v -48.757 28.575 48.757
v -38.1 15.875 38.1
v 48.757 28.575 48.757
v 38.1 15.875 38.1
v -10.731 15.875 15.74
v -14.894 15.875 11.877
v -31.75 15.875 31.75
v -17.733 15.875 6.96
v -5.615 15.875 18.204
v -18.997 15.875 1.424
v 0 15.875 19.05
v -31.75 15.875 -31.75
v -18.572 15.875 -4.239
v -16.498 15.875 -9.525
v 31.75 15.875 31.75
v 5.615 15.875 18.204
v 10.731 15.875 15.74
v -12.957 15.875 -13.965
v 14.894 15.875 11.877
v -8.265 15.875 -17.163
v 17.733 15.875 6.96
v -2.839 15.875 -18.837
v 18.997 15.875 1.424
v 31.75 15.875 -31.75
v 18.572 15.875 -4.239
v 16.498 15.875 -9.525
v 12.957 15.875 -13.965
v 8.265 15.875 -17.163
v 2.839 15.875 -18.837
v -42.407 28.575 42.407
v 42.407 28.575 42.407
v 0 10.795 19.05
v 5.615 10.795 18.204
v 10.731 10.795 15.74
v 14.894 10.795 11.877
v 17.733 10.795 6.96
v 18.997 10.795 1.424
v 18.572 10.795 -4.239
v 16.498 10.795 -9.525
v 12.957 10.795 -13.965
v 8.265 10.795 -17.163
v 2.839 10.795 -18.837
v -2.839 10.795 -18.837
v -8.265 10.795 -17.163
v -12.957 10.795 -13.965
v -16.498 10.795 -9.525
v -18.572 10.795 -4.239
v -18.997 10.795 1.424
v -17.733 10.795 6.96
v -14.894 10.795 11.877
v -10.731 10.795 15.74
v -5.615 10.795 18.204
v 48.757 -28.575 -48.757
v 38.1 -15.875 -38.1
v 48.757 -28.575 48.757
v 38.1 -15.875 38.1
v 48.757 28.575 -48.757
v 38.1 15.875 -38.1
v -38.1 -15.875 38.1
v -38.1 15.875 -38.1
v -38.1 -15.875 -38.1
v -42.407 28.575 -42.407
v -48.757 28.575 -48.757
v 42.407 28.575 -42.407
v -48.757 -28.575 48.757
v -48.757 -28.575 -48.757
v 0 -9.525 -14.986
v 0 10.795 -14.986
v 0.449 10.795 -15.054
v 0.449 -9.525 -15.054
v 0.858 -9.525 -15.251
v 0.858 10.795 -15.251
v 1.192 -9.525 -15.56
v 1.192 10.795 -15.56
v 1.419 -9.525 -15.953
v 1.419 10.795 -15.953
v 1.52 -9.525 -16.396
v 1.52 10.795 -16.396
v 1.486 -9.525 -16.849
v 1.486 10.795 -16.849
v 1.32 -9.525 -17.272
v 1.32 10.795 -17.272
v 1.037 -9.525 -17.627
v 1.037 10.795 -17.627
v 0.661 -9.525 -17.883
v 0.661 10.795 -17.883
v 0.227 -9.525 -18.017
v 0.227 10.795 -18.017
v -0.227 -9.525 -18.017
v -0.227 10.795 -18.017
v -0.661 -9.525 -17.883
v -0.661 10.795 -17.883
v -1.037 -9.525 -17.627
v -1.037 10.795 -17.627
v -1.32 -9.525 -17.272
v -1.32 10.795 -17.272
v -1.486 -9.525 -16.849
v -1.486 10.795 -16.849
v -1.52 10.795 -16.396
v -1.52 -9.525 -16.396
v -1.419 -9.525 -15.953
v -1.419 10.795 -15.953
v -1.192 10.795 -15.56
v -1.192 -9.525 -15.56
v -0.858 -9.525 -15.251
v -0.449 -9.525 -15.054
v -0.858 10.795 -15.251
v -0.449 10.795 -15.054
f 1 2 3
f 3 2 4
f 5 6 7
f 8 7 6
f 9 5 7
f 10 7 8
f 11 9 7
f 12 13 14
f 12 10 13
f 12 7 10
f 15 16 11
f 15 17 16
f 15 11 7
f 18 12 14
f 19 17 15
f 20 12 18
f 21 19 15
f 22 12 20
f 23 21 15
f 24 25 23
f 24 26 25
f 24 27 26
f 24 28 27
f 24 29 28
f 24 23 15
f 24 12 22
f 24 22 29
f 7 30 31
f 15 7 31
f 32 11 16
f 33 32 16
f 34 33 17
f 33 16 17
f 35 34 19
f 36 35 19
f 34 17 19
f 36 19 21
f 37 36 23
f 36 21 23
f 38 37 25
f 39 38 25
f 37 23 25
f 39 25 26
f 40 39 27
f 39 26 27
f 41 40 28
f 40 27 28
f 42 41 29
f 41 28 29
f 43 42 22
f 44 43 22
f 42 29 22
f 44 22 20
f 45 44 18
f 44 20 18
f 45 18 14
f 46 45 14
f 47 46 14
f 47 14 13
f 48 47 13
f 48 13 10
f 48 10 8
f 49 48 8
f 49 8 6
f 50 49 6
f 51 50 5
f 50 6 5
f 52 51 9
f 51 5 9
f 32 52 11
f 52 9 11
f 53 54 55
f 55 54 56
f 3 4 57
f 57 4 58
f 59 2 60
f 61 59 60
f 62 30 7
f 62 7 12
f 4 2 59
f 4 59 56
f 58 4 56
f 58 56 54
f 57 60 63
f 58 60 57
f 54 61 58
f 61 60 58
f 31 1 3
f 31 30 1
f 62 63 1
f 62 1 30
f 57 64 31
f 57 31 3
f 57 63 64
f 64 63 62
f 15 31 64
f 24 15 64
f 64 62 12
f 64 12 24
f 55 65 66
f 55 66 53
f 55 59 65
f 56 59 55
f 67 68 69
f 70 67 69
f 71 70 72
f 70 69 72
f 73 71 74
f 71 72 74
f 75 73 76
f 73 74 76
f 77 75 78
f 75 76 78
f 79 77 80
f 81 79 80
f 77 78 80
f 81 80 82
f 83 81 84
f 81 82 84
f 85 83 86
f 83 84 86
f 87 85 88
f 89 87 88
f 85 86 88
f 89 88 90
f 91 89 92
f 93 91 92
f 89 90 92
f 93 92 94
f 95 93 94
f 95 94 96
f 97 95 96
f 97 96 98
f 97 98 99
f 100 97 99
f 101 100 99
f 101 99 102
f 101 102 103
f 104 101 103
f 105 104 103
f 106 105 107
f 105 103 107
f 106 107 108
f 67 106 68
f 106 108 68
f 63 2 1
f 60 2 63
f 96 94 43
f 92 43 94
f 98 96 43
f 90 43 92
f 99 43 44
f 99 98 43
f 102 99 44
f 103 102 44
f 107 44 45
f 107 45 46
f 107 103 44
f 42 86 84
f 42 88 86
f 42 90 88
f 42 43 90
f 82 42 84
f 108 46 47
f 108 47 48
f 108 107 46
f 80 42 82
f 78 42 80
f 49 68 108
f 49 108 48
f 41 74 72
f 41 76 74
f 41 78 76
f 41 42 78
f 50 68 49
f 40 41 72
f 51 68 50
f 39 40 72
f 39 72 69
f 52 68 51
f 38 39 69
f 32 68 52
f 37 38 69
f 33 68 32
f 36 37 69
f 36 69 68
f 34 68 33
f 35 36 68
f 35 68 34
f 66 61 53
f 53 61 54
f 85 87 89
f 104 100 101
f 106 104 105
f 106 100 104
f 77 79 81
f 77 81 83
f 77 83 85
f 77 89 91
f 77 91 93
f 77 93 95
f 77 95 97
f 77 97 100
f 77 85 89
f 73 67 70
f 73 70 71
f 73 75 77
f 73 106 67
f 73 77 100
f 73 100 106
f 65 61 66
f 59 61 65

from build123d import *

# Parameters (mm, degrees)
SKETCH1_W               = 76.2
SKETCH1_H               = 76.2
BOSS_EXTRUDE1_DEPTH     = 15.875
SKETCH2_W               = 76.2
SKETCH2_H               = 76.2
BOSS_EXTRUDE2_DEPTH     = 12.7
BOSS_EXTRUDE2_DRAFT     = -40
MIRROR1_COPY_1_SKETCH_W = 76.2
MIRROR1_COPY_1_SKETCH_H = 76.2
MIRROR1_COPY_1_DEPTH    = 12.7
MIRROR1_COPY_1_DRAFT    = -40
SKETCH4_W               = 84.813130632
SKETCH4_H               = 84.813130632
CUT_EXTRUDE2_DEPTH      = 12.7
CUT_EXTRUDE2_DRAFT      = -40
SKETCH5_R               = 19.05
CUT_EXTRUDE3_DEPTH      = 5.08
SKETCH6_R               = 1.524
CUT_EXTRUDE4_DEPTH      = 20.32


with BuildPart() as part:
    # Sketch1 → Boss-Extrude1 (new, symmetric)
    with BuildSketch(Plane(origin=(0, 0, 0), x_dir=(1, 0, 0), z_dir=(0, 1, 0))):
        Rectangle(SKETCH1_W, SKETCH1_H)
    extrude(amount=BOSS_EXTRUDE1_DEPTH, both=True)


with BuildPart() as boss_extrude2_tool:
    # Sketch2 → Boss-Extrude2 (with draft: the straight prism first)
    with BuildSketch(Plane(origin=(0, 15.875, 0), x_dir=(1, 0, 0), z_dir=(0, 1, 0))):
        Rectangle(SKETCH2_W, SKETCH2_H)
    extrude(amount=BOSS_EXTRUDE2_DEPTH)
    # Boss-Extrude2: the draft: its side faces are tilted about the plane it starts from
    boss_extrude2_sides = [boss_extrude2_tool.faces().sort_by_distance(p)[0] for p in [
        (-38.1, 22.225, 0),
        (0, 22.225, 38.1),
        (38.1, 22.225, 0),
        (0, 22.225, -38.1),
    ]]
    draft(boss_extrude2_sides, Plane(origin=(0, 15.875, 0), x_dir=(1, 0, 0), z_dir=(0, 1, 0)), BOSS_EXTRUDE2_DRAFT)


with BuildPart() as part_1:
    add(part.part)

    # Boss-Extrude2: add boss_extrude2_tool
    add(boss_extrude2_tool.part)


with BuildPart() as mirror1_copy_1_tool:
    # Mirror1 copy 1 sketch → Mirror1 copy 1 (with draft: the straight prism first)
    with BuildSketch(Plane.XZ.offset(15.875)):
        Rectangle(MIRROR1_COPY_1_SKETCH_W, MIRROR1_COPY_1_SKETCH_H)
    extrude(amount=MIRROR1_COPY_1_DEPTH)
    # Mirror1 copy 1: the draft: its side faces are tilted about the plane it starts from
    mirror1_copy_1_sides = [mirror1_copy_1_tool.faces().sort_by_distance(p)[0] for p in [
        (-38.1, -22.225, 0),
        (0, -22.225, 38.1),
        (38.1, -22.225, 0),
        (0, -22.225, -38.1),
    ]]
    draft(mirror1_copy_1_sides, Plane.XZ.offset(15.875), MIRROR1_COPY_1_DRAFT)


with BuildPart() as part_2:
    add(part_1.part)

    # Mirror1 copy 1: add mirror1_copy_1_tool
    add(mirror1_copy_1_tool.part)


with BuildPart() as cut_extrude2_tool:
    # Sketch4 → Cut-Extrude2 (with draft: the straight prism first)
    with BuildSketch(Plane(origin=(0, 28.575, 0), x_dir=(1, 0, 0), z_dir=(0, 1, 0))):
        Rectangle(SKETCH4_W, SKETCH4_H)
    extrude(amount=-CUT_EXTRUDE2_DEPTH)
    # Cut-Extrude2: the draft: its side faces are tilted about the plane it starts from
    cut_extrude2_sides = [cut_extrude2_tool.faces().sort_by_distance(p)[0] for p in [
        (42.406565316, 22.225, 0),
        (0, 22.225, -42.406565316),
        (-42.406565316, 22.225, 0),
        (0, 22.225, 42.406565316),
    ]]
    draft(cut_extrude2_sides, Plane(origin=(0, 28.575, 0), x_dir=(1, 0, 0), z_dir=(0, 1, 0)), CUT_EXTRUDE2_DRAFT)


with BuildPart() as part_3:
    add(part_2.part)

    # Cut-Extrude2: cut by cut_extrude2_tool
    add(cut_extrude2_tool.part, mode=Mode.SUBTRACT)

    # Sketch5 → Cut-Extrude3 (cut)
    with BuildSketch(Plane(origin=(0, 15.875, 0), x_dir=(1, 0, 0), z_dir=(0, 1, 0))):
        with Locations(Location((0, 0, 0), (0, 0, 270))):
            Circle(SKETCH5_R)
    extrude(amount=-CUT_EXTRUDE3_DEPTH, mode=Mode.SUBTRACT)

    # Sketch6 → Cut-Extrude4 (cut)
    with BuildSketch(Plane(origin=(0, 10.795, 0), x_dir=(1, 0, 0), z_dir=(0, 1, 0))):
        with Locations(Location((0, 16.51, 0), (0, 0, 270))):
            Circle(SKETCH6_R)
    extrude(amount=-CUT_EXTRUDE4_DEPTH, mode=Mode.SUBTRACT)


solid = part_3.part
